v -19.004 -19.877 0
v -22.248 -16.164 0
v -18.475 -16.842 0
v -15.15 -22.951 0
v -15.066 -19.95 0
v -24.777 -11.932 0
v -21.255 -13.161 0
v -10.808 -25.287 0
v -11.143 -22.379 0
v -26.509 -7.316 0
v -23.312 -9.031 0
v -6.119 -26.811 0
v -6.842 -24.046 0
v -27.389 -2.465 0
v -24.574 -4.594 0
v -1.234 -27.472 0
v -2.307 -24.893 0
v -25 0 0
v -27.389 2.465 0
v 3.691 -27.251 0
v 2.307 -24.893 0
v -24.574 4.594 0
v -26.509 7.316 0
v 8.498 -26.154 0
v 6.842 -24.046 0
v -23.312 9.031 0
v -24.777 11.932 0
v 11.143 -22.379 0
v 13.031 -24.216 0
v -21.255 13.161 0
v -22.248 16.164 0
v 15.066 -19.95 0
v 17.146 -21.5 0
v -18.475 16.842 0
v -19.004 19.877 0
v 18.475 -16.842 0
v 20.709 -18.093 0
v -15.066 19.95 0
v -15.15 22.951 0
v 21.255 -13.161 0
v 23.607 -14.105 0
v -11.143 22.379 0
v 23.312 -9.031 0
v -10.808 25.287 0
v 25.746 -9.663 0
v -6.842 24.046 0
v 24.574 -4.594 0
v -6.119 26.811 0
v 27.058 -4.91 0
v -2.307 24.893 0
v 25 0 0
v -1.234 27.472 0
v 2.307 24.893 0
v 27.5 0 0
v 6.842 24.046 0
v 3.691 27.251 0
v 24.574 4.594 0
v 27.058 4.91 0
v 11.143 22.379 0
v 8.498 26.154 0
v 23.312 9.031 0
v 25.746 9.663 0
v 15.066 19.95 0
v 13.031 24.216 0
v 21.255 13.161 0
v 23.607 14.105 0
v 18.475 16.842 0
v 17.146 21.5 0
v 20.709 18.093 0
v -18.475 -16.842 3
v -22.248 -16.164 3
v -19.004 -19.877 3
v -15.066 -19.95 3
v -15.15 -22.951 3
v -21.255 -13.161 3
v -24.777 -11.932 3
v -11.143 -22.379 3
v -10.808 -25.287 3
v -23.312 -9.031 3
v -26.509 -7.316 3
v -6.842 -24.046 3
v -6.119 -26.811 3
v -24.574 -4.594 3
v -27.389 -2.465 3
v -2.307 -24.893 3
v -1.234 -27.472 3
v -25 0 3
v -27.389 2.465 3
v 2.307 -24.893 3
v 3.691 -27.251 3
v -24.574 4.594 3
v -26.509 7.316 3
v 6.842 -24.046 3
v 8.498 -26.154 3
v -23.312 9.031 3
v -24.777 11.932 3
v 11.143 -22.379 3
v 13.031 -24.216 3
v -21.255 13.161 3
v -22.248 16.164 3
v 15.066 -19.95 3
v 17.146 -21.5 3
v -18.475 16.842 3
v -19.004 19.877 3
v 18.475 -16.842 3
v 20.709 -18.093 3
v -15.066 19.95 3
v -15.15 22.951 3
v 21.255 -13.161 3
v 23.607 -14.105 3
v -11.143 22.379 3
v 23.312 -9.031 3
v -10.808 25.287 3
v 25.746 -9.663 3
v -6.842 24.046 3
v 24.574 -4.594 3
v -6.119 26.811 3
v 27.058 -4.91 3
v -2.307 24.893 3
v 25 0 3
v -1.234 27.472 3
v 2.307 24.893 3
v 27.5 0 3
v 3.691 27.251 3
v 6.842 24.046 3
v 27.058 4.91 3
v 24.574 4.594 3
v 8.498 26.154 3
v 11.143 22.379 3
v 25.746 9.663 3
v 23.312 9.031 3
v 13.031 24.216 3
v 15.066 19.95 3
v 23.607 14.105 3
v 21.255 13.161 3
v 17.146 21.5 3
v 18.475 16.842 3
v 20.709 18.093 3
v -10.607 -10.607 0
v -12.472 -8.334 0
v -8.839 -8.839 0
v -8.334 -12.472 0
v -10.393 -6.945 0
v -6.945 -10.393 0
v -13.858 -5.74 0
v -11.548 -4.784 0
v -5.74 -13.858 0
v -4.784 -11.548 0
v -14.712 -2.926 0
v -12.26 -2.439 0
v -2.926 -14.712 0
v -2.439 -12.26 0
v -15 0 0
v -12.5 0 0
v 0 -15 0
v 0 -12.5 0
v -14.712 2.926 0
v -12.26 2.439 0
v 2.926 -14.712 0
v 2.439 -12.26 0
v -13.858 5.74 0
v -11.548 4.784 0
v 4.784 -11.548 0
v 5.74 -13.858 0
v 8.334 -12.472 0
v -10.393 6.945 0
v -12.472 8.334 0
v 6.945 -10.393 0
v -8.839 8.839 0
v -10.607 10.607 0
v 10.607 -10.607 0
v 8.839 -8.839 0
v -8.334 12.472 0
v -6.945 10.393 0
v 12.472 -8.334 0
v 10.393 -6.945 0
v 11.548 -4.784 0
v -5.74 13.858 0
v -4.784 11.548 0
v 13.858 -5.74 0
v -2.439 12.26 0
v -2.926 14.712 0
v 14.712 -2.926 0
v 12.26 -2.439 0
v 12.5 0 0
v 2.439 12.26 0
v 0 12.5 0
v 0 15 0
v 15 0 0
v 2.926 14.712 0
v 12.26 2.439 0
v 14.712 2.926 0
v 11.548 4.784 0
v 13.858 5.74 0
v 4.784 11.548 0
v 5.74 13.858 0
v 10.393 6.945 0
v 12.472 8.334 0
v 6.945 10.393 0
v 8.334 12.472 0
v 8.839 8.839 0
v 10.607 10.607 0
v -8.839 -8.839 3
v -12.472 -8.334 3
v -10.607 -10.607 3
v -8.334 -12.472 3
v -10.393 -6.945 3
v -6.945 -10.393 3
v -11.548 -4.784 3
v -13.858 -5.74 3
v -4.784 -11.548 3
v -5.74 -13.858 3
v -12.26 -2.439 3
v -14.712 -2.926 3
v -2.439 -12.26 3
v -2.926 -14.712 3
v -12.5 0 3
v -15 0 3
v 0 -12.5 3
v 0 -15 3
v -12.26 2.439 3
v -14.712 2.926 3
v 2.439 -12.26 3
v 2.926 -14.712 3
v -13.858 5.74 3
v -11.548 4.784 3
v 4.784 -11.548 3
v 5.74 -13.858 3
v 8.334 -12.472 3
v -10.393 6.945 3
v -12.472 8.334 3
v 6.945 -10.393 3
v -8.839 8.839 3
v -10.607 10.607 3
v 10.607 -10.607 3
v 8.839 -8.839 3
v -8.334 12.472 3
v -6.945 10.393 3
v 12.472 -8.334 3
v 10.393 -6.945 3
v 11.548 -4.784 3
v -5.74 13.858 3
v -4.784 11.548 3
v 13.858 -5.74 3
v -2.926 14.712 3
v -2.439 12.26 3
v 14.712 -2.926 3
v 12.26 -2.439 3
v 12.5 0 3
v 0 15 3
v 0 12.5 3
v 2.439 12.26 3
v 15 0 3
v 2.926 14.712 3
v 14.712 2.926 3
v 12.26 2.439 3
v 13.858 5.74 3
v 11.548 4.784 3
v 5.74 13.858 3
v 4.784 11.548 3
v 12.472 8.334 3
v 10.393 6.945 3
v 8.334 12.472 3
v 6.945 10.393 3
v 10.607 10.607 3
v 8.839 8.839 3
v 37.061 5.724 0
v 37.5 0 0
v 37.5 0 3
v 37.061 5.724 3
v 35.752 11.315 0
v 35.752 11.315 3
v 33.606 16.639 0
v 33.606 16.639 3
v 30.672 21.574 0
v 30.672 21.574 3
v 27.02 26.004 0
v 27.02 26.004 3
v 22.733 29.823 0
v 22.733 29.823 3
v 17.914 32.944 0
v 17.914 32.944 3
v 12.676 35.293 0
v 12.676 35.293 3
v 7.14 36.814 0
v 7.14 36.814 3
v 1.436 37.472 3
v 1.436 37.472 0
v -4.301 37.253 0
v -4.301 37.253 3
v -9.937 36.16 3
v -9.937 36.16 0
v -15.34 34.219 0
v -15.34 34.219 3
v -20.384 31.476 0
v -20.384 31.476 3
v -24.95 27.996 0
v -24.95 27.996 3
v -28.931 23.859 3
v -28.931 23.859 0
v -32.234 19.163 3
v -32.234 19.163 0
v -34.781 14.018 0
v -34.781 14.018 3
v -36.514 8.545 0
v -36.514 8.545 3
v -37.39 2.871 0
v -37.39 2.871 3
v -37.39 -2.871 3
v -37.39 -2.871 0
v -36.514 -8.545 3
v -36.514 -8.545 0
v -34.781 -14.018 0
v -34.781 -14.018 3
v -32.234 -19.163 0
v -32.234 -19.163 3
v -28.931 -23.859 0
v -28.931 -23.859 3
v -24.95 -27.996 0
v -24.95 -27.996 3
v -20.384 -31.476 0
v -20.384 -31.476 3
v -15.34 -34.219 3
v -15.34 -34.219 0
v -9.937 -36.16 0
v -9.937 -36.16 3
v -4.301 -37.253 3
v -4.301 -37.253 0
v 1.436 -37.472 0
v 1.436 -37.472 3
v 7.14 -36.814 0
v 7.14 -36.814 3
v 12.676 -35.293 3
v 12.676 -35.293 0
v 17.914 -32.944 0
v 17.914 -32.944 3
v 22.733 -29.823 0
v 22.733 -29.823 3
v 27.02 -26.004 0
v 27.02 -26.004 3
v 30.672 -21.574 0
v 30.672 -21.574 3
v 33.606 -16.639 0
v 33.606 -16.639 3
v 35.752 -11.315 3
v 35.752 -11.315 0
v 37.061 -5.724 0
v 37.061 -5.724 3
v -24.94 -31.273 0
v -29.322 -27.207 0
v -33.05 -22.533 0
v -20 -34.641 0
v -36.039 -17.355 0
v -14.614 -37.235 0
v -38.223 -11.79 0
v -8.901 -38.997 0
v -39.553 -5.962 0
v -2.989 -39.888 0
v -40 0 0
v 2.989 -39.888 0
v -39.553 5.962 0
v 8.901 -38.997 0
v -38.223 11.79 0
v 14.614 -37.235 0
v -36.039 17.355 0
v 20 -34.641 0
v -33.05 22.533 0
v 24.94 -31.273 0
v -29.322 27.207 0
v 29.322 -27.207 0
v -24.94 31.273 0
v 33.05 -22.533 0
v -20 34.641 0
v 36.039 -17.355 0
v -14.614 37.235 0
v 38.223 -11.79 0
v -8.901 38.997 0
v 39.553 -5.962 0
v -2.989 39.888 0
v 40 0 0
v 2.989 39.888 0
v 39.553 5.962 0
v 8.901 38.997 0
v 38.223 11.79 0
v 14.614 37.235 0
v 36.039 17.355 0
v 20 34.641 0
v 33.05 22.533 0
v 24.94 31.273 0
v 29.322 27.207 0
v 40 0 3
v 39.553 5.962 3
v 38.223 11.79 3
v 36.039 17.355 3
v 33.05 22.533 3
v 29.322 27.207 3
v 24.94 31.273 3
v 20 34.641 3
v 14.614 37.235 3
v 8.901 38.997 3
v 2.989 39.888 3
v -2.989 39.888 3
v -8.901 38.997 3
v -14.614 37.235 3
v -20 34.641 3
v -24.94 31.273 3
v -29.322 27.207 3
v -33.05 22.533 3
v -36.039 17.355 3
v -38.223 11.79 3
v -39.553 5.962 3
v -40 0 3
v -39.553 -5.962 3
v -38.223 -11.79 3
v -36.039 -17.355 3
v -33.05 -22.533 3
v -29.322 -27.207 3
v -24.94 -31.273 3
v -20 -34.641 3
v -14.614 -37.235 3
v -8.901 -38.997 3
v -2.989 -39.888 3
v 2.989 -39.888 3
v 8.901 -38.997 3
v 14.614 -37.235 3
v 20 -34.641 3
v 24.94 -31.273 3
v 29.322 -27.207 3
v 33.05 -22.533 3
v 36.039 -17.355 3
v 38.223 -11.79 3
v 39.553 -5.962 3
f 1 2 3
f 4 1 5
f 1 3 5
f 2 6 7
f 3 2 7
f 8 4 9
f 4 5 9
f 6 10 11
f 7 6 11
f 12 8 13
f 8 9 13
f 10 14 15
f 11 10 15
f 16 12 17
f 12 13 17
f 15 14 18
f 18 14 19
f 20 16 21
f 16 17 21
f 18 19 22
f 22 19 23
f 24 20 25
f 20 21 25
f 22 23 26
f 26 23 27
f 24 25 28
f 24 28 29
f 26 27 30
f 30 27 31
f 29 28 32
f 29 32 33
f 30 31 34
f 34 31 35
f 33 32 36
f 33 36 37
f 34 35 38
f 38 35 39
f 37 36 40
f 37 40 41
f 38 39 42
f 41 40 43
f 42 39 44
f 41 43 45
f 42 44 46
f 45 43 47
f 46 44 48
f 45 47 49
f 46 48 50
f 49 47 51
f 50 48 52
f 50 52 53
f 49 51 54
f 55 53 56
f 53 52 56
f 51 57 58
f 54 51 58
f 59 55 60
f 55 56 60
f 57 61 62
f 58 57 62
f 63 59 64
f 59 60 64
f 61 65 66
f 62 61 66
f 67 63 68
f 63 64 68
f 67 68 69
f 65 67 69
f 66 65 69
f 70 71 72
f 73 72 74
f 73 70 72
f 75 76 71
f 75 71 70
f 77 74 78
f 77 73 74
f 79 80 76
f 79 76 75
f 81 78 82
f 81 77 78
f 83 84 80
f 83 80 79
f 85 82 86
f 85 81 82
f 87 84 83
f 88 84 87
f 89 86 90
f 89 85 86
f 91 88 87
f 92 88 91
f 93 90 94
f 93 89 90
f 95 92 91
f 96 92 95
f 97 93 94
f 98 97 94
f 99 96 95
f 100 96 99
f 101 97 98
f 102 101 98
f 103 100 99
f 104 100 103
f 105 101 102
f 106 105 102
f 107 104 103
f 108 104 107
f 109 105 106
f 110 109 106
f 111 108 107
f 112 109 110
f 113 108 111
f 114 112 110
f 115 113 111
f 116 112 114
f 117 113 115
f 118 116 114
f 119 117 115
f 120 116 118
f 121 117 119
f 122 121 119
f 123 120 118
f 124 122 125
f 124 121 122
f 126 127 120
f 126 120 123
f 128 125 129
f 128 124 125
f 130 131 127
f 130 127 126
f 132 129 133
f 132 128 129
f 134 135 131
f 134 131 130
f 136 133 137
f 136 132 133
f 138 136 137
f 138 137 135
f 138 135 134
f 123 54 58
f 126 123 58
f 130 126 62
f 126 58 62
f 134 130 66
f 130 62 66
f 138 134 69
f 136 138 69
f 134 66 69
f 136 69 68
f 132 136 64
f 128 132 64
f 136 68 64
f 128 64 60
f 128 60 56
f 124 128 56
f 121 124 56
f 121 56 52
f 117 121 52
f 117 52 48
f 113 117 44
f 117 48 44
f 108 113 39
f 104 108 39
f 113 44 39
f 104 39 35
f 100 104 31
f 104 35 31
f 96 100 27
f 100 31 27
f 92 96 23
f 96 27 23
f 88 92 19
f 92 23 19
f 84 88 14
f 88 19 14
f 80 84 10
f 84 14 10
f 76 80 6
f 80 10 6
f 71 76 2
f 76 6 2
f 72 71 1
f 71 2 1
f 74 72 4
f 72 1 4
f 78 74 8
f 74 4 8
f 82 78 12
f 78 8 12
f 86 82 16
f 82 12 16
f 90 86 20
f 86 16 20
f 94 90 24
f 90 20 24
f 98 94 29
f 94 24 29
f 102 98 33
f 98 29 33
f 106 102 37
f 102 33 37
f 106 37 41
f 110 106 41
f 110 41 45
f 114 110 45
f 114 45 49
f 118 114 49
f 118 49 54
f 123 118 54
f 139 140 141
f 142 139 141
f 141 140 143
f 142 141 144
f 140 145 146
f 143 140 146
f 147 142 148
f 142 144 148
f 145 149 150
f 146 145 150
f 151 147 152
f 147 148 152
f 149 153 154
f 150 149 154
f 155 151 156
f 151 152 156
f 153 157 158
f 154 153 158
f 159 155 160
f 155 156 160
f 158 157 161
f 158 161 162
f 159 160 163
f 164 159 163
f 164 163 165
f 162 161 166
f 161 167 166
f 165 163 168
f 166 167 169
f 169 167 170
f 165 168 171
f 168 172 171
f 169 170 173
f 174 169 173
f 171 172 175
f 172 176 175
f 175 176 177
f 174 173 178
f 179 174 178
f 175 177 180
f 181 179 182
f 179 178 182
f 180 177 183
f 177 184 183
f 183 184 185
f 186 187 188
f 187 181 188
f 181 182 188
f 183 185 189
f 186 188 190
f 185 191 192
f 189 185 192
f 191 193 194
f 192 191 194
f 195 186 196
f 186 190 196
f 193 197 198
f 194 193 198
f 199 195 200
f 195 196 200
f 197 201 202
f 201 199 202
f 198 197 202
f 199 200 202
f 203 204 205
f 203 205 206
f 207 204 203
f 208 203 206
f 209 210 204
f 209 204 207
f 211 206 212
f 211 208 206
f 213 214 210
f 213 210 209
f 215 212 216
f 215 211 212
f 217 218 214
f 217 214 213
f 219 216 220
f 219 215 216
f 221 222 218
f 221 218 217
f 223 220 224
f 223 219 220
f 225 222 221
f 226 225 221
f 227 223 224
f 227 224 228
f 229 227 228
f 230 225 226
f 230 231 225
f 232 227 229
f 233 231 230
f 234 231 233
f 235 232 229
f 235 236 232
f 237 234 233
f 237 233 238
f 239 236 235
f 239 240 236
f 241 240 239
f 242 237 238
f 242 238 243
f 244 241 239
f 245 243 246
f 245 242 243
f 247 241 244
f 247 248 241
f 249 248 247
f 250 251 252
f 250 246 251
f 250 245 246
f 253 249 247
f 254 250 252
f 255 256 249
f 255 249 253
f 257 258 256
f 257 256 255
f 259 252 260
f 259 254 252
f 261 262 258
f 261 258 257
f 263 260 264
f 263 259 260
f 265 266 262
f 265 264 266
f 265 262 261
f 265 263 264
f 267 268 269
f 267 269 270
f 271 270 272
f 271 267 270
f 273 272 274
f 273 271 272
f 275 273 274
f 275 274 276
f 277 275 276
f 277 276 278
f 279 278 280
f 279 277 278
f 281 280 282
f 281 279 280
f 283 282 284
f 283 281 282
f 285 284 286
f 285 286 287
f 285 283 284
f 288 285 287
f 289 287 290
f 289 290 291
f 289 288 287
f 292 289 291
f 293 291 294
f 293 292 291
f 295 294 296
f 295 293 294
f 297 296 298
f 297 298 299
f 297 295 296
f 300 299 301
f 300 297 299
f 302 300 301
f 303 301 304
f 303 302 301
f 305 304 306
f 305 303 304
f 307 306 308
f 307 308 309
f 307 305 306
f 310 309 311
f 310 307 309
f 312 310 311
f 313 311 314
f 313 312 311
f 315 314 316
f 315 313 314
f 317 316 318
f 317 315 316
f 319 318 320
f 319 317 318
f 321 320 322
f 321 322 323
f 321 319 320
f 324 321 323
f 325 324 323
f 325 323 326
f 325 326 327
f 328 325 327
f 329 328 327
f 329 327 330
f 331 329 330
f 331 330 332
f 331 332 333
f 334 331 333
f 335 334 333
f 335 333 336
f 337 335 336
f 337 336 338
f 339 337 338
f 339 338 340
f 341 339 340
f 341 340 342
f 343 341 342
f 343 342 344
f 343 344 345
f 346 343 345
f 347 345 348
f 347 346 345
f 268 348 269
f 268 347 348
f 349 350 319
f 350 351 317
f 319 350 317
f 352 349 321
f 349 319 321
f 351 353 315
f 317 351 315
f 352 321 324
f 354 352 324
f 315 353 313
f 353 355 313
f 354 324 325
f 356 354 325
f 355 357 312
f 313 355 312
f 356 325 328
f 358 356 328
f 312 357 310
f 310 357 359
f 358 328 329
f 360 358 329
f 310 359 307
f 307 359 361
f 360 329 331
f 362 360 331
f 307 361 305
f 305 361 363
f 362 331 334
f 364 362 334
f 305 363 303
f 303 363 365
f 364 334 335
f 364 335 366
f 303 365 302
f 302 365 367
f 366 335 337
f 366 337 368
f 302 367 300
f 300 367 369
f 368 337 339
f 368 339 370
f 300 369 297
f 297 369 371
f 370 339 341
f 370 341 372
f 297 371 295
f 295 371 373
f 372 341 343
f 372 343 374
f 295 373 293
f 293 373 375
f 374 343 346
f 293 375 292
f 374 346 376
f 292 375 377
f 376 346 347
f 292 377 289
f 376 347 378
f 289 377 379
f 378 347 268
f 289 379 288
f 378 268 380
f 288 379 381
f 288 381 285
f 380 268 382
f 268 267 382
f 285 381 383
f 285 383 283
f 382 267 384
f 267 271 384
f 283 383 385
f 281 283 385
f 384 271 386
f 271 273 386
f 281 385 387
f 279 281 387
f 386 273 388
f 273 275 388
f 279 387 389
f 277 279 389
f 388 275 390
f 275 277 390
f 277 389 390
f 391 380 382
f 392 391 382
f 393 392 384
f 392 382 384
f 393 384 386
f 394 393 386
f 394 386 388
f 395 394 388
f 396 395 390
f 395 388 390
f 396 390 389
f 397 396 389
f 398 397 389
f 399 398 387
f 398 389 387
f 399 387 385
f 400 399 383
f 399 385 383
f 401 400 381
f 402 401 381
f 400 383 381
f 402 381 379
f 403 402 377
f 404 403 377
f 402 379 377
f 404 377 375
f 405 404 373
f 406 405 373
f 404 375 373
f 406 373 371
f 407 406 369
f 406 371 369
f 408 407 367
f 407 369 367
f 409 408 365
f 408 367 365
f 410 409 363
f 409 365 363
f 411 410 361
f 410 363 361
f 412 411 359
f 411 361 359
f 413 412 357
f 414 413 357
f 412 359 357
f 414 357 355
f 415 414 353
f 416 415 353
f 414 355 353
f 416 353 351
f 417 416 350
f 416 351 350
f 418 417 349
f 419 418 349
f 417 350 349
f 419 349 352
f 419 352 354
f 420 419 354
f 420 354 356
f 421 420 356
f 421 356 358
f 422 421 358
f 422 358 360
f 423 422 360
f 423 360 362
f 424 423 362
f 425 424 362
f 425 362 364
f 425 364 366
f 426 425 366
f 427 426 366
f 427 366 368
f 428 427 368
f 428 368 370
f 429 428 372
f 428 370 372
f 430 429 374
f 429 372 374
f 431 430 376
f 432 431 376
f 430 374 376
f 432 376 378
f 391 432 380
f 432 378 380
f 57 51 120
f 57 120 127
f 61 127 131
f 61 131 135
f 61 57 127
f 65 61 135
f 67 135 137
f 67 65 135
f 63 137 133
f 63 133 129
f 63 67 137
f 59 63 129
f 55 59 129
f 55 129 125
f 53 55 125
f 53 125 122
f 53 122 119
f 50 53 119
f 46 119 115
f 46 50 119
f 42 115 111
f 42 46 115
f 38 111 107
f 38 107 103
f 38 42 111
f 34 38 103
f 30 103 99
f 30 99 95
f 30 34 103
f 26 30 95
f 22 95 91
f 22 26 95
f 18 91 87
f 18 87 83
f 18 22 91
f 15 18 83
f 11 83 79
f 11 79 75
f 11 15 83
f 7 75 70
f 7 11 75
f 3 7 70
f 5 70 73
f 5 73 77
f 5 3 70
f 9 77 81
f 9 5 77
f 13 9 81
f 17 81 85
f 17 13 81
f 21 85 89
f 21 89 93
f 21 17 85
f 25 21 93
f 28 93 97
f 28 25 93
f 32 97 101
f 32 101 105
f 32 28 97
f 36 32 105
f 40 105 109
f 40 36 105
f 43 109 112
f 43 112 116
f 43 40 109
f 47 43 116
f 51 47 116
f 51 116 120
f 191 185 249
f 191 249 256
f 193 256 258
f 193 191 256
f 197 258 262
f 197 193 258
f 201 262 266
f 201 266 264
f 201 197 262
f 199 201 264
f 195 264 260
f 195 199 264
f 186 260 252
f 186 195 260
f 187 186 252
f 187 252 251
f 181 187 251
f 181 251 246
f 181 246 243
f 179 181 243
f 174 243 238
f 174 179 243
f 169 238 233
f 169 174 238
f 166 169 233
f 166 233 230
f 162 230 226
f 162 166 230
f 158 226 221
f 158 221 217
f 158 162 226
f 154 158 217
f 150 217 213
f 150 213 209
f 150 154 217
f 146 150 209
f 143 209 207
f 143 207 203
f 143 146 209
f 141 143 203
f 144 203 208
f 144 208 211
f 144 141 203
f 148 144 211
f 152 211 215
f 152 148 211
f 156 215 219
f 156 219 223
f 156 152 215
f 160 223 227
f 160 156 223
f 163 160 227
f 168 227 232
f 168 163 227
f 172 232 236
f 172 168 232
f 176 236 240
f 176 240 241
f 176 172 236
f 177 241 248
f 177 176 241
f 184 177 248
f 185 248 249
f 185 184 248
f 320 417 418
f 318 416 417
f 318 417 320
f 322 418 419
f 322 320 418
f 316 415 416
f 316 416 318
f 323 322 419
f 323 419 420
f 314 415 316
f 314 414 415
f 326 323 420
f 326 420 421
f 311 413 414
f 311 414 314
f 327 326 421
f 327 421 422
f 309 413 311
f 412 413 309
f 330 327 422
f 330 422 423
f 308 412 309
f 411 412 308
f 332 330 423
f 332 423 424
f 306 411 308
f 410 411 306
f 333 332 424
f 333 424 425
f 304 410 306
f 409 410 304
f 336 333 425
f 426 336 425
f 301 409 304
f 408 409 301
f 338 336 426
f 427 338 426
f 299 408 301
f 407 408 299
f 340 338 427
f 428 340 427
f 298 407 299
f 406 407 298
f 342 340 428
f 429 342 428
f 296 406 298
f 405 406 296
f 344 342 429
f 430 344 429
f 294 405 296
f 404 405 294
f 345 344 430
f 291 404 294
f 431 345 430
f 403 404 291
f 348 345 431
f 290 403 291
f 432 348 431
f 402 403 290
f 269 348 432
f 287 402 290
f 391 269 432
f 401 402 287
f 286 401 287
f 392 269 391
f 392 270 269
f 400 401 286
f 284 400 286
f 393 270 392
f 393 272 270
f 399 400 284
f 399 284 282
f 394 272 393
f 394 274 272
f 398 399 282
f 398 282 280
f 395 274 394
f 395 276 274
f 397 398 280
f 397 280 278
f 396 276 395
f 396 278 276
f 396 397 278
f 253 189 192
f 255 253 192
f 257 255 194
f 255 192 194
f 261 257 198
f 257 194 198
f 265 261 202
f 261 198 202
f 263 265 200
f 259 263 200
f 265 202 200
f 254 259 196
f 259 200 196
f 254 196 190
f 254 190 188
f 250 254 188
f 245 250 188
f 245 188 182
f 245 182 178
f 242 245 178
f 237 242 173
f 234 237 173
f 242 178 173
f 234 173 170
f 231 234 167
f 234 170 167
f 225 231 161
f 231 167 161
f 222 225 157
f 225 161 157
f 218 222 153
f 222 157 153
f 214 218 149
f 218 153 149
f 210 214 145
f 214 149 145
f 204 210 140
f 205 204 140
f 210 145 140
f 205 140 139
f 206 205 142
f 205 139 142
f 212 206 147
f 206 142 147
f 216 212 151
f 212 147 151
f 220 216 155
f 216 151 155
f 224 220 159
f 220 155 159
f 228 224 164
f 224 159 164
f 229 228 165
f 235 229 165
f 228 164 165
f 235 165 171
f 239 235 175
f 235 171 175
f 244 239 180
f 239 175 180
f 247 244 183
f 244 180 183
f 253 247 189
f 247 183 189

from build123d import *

# Parameters (mm, degrees)
SKETCH1_R             = 40
SKETCH1_R_2           = 37.5
BOSS_EXTRUDE1_DEPTH   = 3
SKETCH1_R_3           = 27.5
SKETCH1_R_4           = 25
BOSS_EXTRUDE1_2_DEPTH = 3
SKETCH1_R_5           = 15
SKETCH1_R_6           = 12.5
BOSS_EXTRUDE1_3_DEPTH = 3


with BuildPart() as part:
    # Sketch1 → Boss-Extrude1 (new body)
    with BuildSketch(Plane.XY):
        Circle(SKETCH1_R)
        Circle(SKETCH1_R_2, mode=Mode.SUBTRACT)
    extrude(amount=BOSS_EXTRUDE1_DEPTH)


with BuildPart() as body_2:
    # Sketch1 → Boss-Extrude1 2 (new body)
    with BuildSketch(Plane.XY):
        Circle(SKETCH1_R_3)
        Circle(SKETCH1_R_4, mode=Mode.SUBTRACT)
    extrude(amount=BOSS_EXTRUDE1_2_DEPTH)


with BuildPart() as body_3:
    # Sketch1 → Boss-Extrude1 3 (new body)
    with BuildSketch(Plane.XY):
        Circle(SKETCH1_R_5)
        Circle(SKETCH1_R_6, mode=Mode.SUBTRACT)
    extrude(amount=BOSS_EXTRUDE1_3_DEPTH)


solid = Compound([part.part, body_2.part, body_3.part])
